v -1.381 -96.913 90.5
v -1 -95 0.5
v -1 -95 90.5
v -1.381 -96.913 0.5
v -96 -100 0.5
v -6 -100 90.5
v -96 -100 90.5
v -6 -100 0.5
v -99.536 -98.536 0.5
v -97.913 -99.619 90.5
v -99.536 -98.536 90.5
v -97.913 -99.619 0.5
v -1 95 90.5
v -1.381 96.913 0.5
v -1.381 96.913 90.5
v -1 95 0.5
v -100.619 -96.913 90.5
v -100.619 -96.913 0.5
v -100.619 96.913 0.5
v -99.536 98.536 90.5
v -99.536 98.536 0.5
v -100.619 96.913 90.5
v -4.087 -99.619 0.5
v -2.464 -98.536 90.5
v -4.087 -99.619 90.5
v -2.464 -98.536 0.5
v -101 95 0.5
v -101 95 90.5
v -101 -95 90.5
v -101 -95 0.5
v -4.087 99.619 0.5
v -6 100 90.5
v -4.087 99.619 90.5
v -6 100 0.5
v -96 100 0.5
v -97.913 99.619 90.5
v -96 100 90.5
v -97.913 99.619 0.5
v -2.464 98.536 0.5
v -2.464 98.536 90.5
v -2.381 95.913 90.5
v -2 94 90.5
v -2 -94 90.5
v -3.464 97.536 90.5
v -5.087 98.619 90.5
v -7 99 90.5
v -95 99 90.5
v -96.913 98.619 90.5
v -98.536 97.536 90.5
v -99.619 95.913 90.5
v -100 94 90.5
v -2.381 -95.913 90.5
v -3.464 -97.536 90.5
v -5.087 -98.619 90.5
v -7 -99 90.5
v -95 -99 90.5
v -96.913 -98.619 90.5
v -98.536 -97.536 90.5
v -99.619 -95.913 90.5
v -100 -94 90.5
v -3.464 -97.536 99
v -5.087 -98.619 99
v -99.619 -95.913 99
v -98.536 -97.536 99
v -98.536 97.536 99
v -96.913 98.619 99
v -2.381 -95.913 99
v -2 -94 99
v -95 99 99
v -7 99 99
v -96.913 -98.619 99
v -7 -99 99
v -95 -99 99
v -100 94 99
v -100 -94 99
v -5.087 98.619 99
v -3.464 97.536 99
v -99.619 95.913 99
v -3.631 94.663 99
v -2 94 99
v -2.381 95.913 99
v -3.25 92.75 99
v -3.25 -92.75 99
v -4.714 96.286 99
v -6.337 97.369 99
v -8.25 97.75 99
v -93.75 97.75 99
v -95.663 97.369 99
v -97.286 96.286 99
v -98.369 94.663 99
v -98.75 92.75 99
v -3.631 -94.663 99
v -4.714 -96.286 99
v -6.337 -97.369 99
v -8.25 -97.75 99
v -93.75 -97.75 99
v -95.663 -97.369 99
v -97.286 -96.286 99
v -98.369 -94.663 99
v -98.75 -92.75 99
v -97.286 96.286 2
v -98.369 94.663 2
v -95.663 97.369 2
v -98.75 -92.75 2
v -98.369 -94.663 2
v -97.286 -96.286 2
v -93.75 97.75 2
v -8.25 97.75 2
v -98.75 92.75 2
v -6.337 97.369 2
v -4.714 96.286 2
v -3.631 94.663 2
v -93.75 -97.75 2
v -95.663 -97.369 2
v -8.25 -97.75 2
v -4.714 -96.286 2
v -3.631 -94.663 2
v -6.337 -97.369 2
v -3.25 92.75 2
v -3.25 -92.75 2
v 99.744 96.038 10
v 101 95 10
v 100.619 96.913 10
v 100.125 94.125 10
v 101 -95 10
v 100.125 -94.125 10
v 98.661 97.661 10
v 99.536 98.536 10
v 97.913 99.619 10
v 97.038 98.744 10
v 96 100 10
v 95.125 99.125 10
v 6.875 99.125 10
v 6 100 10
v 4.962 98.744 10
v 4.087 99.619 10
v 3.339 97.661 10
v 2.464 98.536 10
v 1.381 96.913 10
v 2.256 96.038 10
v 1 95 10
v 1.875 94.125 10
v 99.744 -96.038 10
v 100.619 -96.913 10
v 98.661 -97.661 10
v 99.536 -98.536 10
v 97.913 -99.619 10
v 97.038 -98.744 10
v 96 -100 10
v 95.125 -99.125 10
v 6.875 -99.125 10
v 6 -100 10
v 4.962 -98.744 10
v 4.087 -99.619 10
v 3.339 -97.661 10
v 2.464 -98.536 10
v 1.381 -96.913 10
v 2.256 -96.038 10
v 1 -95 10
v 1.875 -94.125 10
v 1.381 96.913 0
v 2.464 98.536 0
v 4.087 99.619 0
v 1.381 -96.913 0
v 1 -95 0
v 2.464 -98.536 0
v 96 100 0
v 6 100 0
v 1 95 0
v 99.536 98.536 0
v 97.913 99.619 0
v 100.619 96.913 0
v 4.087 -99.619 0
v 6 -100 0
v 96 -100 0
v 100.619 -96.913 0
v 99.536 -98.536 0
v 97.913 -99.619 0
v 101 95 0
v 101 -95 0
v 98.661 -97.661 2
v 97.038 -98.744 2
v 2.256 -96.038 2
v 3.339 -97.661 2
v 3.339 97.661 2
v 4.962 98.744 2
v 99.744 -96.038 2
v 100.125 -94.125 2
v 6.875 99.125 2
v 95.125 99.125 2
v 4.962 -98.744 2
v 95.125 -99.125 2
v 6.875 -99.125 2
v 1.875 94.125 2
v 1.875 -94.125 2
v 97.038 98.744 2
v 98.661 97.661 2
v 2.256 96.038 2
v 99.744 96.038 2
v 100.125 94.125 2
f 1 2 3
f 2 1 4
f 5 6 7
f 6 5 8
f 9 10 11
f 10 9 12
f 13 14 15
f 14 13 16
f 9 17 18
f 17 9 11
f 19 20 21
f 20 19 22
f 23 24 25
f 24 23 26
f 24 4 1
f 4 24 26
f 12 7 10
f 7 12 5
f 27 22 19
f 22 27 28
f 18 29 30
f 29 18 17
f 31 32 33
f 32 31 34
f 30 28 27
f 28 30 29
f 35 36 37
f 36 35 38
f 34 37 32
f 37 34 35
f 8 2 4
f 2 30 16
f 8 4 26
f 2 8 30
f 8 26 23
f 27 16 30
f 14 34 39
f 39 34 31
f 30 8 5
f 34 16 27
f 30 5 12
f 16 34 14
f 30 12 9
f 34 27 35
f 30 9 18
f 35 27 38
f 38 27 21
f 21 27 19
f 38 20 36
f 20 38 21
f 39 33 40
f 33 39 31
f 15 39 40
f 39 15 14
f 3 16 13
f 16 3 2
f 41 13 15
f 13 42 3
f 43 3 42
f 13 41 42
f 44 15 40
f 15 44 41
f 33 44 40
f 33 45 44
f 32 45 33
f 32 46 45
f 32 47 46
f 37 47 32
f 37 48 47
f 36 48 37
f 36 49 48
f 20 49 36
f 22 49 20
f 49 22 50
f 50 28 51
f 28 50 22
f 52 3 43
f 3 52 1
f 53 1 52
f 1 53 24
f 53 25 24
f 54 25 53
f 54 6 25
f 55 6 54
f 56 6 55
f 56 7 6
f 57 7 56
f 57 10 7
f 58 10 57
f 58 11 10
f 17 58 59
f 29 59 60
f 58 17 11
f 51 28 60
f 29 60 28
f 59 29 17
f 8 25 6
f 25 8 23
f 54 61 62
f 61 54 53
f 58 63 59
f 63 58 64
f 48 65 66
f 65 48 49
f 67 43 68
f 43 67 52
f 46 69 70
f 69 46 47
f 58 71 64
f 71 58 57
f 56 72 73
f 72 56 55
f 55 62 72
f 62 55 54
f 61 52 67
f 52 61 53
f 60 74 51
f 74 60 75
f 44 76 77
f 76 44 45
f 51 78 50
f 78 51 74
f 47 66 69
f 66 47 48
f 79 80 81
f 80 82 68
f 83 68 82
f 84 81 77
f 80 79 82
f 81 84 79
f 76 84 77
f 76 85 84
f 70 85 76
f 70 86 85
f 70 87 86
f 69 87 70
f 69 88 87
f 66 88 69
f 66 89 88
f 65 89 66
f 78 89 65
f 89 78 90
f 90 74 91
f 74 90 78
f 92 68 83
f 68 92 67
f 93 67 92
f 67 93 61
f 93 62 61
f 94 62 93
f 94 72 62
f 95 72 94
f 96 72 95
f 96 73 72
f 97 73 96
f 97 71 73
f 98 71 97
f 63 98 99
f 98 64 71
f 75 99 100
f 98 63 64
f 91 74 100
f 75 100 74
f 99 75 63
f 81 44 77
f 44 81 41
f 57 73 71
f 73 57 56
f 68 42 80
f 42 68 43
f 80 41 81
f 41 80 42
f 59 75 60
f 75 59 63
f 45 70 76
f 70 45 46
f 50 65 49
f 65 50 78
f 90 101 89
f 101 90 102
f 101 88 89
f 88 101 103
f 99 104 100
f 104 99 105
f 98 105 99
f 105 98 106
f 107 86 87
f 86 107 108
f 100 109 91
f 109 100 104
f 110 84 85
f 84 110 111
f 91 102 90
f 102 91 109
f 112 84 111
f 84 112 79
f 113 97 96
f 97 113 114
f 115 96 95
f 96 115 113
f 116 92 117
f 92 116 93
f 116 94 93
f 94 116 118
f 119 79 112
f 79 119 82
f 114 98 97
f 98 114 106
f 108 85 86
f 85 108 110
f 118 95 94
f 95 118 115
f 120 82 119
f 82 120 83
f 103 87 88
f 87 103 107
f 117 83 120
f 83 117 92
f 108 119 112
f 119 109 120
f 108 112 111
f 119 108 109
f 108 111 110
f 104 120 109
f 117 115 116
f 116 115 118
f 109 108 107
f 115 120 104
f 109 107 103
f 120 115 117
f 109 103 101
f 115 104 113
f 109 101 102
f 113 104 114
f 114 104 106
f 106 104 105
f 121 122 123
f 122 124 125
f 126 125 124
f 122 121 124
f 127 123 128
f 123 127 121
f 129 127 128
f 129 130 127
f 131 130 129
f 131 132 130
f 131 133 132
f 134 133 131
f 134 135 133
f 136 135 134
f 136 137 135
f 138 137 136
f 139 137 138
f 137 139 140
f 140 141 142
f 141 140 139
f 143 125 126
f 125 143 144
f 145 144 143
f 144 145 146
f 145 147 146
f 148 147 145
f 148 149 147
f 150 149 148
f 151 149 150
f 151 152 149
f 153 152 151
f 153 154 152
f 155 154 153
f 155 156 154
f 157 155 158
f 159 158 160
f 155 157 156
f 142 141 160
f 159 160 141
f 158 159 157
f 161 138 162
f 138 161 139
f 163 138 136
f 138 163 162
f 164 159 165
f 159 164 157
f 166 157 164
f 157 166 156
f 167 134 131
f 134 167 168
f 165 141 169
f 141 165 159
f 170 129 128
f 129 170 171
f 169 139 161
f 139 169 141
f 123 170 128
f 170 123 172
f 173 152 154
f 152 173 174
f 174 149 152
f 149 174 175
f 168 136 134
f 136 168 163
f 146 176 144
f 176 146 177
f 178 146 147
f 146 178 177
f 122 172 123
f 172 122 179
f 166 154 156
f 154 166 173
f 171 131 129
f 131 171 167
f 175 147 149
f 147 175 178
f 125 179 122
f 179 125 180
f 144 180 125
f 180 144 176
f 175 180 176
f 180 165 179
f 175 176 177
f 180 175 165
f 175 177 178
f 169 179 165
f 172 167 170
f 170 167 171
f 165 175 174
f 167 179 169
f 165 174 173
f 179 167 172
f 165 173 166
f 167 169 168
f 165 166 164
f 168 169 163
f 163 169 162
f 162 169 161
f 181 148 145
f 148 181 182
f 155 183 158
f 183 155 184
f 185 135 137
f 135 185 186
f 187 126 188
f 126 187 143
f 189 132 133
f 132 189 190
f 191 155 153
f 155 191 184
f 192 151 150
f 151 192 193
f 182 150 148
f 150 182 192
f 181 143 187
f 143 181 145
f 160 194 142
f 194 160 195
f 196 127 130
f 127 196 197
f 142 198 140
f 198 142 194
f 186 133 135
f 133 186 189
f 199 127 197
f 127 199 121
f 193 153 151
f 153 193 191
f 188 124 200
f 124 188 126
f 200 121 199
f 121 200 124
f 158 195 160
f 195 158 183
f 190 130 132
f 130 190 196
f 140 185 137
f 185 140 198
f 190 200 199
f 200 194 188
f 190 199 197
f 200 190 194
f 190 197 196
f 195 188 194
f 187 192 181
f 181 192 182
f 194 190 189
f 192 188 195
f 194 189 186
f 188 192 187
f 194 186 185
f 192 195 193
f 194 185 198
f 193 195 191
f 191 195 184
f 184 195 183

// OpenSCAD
// Loguncov Maxim  28.12.13

// ================ Переменные

/* [Основные] */

// в mm
x_width=100;

// в mm
y_width=200;

// в mm
height=50;

// Толщина стенки в mm
thickness=2; // [1:10]

// Округлость угла mm
radius=5; // [0:50]

// Печатать коробку?
do_box=1; // [0:нет,1:да]

// Печатать крышку?
do_lid=1; // [0:нет,1:да]

// Толщина стенки в mm
lid_thickness=5;


// =============== рассчитанные переменные
lid_height=min(height/4,lid_thickness);
corner_radius=min(radius,x_width/2,y_width/2);
xadj=x_width-(corner_radius*2);
yadj=y_width-(corner_radius*2);
snugfit=0.5/2;

// =============== Программа

// ---- Коробка
if(do_box==1) translate([-((x_width/2+1)*do_lid),0,height/2-thickness]) difference() {

union() {
minkowski() // Основа
{
 cube([xadj,yadj,height-lid_height],center=true);
 cylinder(r=corner_radius,h=height-lid_height);
}

translate([0,0,lid_height-thickness]) minkowski() //Выступ
{
 cube([xadj-thickness,yadj-thickness,height-(thickness*2)],center=true);
 cylinder(r=corner_radius,h=height);
}
}

translate([0,0,thickness*2]) minkowski() // Внутренняя область
{
 cube([xadj-((thickness+snugfit)*2),yadj-((thickness+snugfit)*2),height],center=true);
 cylinder(r=corner_radius,h=height);
}

};

// ---- Крышка
if(do_lid==1) translate([(x_width/2+1)*do_box,0,lid_height/2]) {

difference() {
minkowski() // Основа
{
 cube([xadj,yadj,lid_height],center=true);
 cylinder(r=corner_radius,h=lid_height);
}

translate([0,0,thickness]) minkowski() // Внутренняя область
{
 cube([xadj-(thickness-snugfit),yadj-(thickness-snugfit),lid_height],center=true);
 cylinder(r=corner_radius,h=lid_height);
}
}

};
